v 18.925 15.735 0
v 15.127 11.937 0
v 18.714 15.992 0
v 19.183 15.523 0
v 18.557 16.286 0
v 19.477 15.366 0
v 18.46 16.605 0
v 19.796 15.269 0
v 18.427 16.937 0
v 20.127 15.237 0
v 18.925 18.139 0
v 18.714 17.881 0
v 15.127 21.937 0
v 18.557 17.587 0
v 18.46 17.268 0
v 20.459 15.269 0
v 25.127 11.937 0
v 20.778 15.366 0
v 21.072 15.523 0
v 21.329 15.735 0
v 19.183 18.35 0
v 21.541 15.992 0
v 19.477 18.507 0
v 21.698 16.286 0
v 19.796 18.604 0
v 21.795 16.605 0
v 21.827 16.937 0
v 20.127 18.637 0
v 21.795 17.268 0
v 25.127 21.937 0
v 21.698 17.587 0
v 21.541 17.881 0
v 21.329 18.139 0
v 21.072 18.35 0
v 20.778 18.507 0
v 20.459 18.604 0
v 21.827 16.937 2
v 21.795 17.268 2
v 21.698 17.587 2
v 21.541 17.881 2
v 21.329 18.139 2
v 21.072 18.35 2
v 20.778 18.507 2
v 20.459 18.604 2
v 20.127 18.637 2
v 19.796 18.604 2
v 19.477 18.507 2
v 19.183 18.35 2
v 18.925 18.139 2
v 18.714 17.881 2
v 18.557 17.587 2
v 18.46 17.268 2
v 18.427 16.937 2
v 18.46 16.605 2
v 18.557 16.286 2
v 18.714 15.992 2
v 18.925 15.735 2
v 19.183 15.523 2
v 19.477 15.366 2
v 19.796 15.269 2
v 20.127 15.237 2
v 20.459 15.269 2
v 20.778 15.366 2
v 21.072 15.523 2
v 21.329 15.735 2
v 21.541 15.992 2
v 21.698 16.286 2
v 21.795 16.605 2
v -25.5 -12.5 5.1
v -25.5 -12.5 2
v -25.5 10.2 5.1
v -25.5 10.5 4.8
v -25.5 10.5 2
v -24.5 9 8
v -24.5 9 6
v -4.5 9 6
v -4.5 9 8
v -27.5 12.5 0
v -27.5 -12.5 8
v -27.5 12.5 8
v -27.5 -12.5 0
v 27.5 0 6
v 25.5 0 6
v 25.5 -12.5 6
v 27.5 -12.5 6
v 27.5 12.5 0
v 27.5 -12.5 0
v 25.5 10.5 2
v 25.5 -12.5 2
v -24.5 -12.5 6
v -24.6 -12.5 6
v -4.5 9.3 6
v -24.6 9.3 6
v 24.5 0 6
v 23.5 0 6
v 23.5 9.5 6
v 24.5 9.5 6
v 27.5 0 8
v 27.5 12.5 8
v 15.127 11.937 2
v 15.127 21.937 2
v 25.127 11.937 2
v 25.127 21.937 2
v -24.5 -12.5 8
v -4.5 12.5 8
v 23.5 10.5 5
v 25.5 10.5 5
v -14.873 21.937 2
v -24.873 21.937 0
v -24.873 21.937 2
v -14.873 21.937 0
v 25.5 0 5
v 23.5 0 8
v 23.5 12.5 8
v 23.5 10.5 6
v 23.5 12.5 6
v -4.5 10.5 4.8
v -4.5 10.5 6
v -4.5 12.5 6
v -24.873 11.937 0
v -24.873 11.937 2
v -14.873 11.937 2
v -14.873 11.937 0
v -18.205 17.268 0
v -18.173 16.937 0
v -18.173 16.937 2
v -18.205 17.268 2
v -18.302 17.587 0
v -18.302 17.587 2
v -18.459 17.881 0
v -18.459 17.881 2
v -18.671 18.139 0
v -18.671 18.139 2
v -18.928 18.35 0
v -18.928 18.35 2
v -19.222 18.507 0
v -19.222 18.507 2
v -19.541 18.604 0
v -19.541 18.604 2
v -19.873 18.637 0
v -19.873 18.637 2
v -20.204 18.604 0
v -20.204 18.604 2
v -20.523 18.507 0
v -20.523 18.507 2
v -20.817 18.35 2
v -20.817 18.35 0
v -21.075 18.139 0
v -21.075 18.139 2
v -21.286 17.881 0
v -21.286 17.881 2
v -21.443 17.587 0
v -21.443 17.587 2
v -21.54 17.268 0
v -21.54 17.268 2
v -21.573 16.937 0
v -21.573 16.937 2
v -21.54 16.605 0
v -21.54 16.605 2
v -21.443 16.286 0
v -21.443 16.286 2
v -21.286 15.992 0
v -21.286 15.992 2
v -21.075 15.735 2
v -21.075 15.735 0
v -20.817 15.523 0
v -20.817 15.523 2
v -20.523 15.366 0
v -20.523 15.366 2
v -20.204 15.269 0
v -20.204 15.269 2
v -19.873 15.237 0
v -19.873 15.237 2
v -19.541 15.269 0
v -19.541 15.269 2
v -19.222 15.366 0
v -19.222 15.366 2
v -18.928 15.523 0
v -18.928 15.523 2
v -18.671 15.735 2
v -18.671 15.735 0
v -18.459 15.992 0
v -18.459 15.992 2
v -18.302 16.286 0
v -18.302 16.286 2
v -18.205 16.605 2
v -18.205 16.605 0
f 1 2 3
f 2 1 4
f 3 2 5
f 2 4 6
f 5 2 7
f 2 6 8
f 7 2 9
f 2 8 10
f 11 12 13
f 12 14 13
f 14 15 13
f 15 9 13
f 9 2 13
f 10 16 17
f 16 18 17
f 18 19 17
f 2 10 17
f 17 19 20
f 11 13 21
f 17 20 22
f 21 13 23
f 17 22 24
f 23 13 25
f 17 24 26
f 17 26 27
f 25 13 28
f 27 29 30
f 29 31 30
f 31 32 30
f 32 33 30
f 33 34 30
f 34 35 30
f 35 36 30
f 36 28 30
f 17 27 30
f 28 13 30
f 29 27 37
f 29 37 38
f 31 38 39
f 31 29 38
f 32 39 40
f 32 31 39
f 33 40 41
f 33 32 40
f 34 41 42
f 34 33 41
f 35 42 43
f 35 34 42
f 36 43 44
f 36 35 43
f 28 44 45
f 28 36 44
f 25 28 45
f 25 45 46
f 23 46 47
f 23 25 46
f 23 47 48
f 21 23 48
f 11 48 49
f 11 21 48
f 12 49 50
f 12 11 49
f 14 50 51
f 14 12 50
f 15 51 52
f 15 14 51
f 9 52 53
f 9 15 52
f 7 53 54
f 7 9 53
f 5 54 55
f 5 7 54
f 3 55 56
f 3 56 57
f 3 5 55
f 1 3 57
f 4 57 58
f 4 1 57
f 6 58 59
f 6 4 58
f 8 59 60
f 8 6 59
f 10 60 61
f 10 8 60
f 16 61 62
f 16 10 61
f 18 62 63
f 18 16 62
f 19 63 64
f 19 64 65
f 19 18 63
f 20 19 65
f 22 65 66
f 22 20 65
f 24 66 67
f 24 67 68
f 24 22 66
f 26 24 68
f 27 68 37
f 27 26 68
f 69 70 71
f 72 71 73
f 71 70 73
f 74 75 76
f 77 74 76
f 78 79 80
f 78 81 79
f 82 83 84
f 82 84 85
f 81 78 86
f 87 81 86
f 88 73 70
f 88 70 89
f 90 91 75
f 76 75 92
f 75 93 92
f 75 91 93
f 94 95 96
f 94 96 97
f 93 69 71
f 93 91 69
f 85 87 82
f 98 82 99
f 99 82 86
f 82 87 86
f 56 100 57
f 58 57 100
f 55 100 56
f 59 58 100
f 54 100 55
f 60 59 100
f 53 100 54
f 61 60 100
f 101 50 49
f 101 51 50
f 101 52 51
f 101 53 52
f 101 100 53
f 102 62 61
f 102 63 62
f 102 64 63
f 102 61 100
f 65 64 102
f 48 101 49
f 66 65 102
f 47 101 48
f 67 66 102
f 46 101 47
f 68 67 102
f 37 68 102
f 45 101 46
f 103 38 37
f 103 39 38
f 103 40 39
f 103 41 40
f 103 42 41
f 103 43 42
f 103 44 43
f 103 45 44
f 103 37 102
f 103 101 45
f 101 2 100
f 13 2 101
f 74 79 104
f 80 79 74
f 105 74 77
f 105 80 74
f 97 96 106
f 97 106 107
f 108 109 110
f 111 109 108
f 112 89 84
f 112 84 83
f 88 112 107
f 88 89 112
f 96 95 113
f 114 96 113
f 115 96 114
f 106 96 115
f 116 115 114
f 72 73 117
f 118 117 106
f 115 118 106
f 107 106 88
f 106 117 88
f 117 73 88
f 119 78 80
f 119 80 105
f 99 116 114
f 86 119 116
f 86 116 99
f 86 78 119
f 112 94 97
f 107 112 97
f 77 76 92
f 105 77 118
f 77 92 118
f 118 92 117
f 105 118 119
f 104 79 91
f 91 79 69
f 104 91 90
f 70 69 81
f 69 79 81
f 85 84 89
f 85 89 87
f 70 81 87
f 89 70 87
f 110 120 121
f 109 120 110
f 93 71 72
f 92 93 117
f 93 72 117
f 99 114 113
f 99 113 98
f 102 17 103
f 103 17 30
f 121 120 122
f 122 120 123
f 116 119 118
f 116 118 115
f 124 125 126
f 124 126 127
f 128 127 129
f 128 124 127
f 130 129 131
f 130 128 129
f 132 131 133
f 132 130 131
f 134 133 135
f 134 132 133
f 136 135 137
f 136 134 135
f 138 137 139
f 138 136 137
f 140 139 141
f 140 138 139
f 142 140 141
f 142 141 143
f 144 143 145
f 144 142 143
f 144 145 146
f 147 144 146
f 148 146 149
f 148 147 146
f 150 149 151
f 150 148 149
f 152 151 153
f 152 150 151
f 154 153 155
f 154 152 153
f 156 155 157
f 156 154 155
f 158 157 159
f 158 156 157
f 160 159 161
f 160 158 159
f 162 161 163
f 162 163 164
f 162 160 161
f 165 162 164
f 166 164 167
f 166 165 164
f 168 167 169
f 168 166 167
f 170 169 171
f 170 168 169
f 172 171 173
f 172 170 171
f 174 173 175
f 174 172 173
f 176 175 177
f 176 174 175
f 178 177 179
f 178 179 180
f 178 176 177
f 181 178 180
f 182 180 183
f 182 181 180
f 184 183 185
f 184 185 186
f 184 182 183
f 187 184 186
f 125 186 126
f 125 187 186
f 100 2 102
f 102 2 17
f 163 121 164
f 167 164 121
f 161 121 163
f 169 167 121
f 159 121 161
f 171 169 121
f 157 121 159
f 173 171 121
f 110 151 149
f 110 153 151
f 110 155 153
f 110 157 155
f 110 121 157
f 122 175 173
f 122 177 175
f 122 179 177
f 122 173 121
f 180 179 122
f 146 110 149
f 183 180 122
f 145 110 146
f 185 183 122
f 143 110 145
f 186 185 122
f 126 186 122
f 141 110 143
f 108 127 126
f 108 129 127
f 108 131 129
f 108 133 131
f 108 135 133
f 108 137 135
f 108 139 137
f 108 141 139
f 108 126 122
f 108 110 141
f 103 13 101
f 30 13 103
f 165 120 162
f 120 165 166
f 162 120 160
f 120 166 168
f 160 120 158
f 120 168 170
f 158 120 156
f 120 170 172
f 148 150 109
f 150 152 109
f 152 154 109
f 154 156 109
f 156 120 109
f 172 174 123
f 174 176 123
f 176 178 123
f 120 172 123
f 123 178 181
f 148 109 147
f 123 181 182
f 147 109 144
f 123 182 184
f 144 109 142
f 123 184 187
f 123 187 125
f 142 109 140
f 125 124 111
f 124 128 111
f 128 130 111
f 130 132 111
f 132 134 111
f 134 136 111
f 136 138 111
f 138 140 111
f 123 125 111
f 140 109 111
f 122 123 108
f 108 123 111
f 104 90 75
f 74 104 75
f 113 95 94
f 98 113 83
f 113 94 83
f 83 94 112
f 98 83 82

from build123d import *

# Parameters (mm, degrees)
SKETCH004_W     = 10
SKETCH004_H     = 10
SKETCH004_R     = 1.7
PAD004_DEPTH    = 2
SKETCH_W        = 55
SKETCH_H        = 25
PAD_DEPTH       = 2
SKETCH001_W     = 2
SKETCH001_H     = 25
SKETCH001_W_2   = 51
SKETCH001_H_2   = 2
PAD001_DEPTH    = 4
SKETCH002_W     = 3
SKETCH002_H     = 25
SKETCH002_W_2   = 4
SKETCH002_H_2   = 12.5
PAD002_DEPTH    = 2
SKETCH003_W     = 20
SKETCH003_H     = 3.5
PAD003_DEPTH    = 2
CHAMFER_SIZE    = 0.9
CHAMFER001_SIZE = 1.2
CHAMFER002_SIZE = 1


with BuildPart() as pad004:
    # Sketch004 → Pad004 (new body)
    with BuildSketch(Plane.XY):
        with Locations((-19.872825, 16.936594)):
            Rectangle(SKETCH004_W, SKETCH004_H)
        with Locations((-19.872825, 16.936594)):
            Circle(SKETCH004_R, mode=Mode.SUBTRACT)
        with Locations((20.127175, 16.936594)):
            Rectangle(SKETCH004_W, SKETCH004_H)
        with Locations((20.127175, 16.936594)):
            Circle(SKETCH004_R, mode=Mode.SUBTRACT)
    extrude(amount=PAD004_DEPTH)


with BuildPart() as chamfer002:
    # Sketch → Pad (new body)
    with BuildSketch(Plane.XY):
        Rectangle(SKETCH_W, SKETCH_H)
    extrude(amount=PAD_DEPTH)

    # Sketch001 → Pad001 (new body)
    with BuildSketch(Plane.XY.offset(2)):
        with Locations((-26.5, 0)):
            Rectangle(SKETCH001_W, SKETCH001_H)
        with Locations((26.5, 0)):
            Rectangle(SKETCH001_W, SKETCH001_H)
        with Locations((0, 11.5)):
            Rectangle(SKETCH001_W_2, SKETCH001_H_2)
    extrude(amount=PAD001_DEPTH)

    # Sketch002 → Pad002 (new body)
    with BuildSketch(Plane.XY.offset(6)):
        with Locations((-26, 0)):
            Rectangle(SKETCH002_W, SKETCH002_H)
        with Locations((25.5, 6.25)):
            Rectangle(SKETCH002_W_2, SKETCH002_H_2)
    extrude(amount=PAD002_DEPTH)

    # Sketch003 → Pad003 (new body)
    with BuildSketch(Plane.XY.offset(6)):
        with Locations((-14.5, 10.75)):
            Rectangle(SKETCH003_W, SKETCH003_H)
    extrude(amount=PAD003_DEPTH)

    # Chamfer
    chamfer_edges = [chamfer002.edges().sort_by_distance(p)[0] for p in [
        (-25.5, -1, 6),
    ]]
    chamfer(chamfer_edges, length=CHAMFER_SIZE)

    # Chamfer001
    chamfer001_edges = [chamfer002.edges().sort_by_distance(p)[0] for p in [
        (-14.5, 10.5, 6),
    ]]
    chamfer(chamfer001_edges, length=CHAMFER001_SIZE)

    # Chamfer002
    chamfer002_edges = [chamfer002.edges().sort_by_distance(p)[0] for p in [
        (25.5, 5.25, 6),
        (24.5, 10.5, 6),
    ]]
    chamfer(chamfer002_edges, length=CHAMFER002_SIZE)


solid = Compound([pad004.part, chamfer002.part])
